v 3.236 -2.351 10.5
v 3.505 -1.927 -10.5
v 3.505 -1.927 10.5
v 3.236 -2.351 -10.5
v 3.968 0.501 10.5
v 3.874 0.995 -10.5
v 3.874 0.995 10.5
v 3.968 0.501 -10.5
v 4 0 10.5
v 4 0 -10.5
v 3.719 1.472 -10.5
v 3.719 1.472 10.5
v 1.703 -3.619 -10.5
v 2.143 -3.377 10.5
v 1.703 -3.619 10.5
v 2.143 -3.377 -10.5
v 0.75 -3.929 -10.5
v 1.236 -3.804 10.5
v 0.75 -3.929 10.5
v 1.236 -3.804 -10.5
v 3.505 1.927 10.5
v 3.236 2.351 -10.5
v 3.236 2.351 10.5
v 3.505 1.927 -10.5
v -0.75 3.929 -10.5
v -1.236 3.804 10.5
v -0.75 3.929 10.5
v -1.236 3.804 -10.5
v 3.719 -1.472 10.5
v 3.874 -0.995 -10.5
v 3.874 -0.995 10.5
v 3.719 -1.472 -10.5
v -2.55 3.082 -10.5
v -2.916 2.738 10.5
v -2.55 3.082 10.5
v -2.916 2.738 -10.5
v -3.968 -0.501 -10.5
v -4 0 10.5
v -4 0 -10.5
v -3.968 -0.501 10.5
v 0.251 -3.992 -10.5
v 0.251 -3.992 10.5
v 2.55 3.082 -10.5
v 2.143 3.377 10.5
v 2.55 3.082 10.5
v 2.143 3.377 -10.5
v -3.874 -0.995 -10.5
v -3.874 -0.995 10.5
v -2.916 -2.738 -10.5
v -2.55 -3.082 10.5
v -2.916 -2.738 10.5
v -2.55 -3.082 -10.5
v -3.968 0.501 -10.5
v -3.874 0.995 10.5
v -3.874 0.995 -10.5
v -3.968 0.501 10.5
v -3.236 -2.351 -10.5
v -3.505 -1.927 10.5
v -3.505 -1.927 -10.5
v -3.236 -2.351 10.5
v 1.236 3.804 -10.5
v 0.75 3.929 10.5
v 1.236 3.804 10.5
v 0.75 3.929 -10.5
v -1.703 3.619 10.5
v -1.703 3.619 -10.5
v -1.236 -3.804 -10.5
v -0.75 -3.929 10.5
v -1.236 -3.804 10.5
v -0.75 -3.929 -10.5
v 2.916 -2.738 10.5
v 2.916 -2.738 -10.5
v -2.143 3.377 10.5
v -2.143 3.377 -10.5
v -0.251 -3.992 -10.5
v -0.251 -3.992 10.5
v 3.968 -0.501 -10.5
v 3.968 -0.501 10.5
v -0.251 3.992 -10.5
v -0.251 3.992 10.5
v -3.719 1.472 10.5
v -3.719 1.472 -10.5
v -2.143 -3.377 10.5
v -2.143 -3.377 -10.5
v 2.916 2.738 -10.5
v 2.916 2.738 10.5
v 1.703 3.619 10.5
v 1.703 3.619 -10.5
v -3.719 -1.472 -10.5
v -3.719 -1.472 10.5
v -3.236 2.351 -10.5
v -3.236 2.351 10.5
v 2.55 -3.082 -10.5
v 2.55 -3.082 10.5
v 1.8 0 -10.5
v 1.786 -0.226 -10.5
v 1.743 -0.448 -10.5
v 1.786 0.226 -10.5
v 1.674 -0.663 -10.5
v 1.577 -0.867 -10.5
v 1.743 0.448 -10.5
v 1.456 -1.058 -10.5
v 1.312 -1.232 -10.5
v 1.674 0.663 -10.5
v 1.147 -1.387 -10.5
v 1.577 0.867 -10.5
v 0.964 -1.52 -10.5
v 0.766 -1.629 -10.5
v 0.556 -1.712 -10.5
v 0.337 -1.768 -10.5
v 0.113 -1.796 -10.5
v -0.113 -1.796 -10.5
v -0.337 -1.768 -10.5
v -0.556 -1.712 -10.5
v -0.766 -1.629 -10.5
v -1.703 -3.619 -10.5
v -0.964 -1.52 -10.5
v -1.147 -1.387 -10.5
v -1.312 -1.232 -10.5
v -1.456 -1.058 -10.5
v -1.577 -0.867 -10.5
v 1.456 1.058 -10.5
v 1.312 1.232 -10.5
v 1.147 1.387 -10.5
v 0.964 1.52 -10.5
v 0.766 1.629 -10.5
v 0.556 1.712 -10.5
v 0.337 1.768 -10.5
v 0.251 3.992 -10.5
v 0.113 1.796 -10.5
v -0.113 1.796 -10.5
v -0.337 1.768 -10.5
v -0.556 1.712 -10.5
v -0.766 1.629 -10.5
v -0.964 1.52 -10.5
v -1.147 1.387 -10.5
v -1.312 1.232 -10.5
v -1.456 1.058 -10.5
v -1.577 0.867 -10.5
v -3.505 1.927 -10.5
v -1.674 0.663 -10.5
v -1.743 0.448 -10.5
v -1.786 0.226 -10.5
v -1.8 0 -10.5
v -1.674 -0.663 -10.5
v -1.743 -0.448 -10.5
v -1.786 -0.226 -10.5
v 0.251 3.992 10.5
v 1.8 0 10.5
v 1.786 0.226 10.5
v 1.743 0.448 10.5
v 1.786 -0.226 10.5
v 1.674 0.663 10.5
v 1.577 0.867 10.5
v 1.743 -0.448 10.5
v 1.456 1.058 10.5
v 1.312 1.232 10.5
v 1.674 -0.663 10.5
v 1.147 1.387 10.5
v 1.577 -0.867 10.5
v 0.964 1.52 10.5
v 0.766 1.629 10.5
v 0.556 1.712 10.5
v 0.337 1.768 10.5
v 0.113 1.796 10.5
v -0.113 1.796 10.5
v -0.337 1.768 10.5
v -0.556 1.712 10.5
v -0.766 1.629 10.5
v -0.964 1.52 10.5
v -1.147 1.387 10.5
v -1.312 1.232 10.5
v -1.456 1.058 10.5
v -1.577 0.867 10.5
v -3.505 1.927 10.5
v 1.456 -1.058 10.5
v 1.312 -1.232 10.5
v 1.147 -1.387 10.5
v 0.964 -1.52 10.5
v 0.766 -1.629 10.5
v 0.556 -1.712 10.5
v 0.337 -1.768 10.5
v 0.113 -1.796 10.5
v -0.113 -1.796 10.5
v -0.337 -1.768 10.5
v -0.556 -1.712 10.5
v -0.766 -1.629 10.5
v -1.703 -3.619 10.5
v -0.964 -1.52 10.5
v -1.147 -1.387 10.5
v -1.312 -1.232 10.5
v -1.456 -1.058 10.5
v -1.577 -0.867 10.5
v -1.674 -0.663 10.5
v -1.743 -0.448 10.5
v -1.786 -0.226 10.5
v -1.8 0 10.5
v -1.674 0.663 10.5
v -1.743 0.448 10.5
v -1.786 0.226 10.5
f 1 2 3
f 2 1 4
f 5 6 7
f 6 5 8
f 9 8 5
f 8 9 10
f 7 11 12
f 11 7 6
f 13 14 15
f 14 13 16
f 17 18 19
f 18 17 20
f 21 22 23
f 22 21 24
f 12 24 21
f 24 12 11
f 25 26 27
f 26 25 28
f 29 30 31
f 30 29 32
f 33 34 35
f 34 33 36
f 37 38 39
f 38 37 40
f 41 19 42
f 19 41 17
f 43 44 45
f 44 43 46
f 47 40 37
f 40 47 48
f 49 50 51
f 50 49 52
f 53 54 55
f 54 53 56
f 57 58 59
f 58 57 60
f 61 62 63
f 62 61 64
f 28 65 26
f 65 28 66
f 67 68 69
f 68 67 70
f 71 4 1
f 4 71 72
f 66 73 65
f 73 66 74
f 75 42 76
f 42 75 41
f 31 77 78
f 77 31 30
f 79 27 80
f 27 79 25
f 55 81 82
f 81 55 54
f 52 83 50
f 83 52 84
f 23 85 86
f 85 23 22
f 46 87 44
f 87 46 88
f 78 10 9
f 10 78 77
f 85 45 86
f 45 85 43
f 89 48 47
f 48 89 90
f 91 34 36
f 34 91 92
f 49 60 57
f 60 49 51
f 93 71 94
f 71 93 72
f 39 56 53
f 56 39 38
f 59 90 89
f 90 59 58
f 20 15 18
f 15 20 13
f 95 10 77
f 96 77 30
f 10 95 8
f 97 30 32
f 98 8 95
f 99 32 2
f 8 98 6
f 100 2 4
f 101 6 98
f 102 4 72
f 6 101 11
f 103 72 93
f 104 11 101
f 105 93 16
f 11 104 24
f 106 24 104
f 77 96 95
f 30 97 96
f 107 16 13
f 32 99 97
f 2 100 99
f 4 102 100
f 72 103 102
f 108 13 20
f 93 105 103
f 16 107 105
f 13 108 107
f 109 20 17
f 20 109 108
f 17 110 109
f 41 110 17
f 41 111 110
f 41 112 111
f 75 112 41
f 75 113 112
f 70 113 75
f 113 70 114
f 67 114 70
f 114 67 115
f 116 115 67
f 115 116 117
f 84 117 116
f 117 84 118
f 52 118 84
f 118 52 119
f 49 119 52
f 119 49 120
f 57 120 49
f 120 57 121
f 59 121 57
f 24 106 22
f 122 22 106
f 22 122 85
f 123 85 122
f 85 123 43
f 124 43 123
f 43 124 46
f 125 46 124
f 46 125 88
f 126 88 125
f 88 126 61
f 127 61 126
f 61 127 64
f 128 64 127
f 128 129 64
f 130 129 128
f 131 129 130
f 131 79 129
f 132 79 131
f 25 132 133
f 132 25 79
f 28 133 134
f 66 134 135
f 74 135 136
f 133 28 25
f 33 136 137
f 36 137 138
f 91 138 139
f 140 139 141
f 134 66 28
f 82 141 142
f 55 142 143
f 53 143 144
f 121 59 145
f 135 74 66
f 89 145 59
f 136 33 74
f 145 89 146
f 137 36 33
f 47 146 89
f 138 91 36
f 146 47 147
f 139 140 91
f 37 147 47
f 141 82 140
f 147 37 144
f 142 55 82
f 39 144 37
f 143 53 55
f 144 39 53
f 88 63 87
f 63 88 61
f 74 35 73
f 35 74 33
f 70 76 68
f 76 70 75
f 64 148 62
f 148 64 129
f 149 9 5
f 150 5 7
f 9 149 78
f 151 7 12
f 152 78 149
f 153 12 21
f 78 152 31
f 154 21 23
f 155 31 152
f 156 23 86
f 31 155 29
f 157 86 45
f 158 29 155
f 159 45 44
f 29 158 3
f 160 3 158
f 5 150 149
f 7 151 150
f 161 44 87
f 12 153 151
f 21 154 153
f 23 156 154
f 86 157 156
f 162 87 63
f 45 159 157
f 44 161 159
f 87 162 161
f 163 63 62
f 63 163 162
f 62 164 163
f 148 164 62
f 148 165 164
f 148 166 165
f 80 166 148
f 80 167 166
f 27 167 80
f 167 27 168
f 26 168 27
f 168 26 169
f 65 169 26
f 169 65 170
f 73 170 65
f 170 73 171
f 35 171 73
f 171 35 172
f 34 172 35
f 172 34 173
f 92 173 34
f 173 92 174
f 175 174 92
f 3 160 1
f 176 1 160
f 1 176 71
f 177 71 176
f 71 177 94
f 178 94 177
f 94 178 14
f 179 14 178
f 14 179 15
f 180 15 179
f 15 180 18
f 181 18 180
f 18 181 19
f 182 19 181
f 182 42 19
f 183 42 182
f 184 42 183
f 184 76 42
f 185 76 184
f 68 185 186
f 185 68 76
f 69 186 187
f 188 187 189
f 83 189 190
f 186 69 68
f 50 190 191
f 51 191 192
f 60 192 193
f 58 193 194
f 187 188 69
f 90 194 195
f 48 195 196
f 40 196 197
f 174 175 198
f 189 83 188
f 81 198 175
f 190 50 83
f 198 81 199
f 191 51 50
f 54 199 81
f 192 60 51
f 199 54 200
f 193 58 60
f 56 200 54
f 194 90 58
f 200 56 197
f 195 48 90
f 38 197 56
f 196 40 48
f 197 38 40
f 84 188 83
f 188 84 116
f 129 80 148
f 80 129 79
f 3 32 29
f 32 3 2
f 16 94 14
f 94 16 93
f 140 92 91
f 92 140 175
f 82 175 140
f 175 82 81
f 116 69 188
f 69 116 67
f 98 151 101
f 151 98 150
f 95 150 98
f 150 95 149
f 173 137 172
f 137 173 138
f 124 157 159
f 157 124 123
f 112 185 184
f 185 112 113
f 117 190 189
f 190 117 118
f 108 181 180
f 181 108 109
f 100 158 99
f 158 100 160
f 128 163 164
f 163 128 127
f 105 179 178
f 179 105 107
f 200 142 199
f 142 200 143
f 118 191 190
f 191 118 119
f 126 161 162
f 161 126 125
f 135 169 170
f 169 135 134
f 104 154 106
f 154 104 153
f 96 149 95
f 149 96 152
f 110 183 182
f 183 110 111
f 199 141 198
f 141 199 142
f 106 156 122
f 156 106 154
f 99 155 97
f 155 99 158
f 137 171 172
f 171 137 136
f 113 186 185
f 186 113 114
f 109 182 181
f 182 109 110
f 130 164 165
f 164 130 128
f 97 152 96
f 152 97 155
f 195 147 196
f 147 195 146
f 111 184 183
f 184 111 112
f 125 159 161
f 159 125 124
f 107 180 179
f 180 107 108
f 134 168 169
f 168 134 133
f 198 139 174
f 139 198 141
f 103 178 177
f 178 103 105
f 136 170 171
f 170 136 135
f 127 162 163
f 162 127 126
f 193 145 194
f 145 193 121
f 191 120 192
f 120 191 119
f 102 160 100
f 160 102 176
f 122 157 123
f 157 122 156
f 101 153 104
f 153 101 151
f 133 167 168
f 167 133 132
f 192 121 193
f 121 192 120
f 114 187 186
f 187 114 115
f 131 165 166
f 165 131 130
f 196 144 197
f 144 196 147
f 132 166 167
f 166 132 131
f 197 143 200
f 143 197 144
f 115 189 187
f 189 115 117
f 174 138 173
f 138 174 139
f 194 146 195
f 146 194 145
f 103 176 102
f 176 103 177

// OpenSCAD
$fn = 50;


difference() {
	union() {
		translate(v = [0, 0, -10.5000000000]) {
			cylinder(h = 21, r = 4.0000000000);
		}
	}
	union() {
		#translate(v = [0, 0, -100.0000000000]) {
			cylinder(h = 200, r = 1.8000000000);
		}
	}
}
